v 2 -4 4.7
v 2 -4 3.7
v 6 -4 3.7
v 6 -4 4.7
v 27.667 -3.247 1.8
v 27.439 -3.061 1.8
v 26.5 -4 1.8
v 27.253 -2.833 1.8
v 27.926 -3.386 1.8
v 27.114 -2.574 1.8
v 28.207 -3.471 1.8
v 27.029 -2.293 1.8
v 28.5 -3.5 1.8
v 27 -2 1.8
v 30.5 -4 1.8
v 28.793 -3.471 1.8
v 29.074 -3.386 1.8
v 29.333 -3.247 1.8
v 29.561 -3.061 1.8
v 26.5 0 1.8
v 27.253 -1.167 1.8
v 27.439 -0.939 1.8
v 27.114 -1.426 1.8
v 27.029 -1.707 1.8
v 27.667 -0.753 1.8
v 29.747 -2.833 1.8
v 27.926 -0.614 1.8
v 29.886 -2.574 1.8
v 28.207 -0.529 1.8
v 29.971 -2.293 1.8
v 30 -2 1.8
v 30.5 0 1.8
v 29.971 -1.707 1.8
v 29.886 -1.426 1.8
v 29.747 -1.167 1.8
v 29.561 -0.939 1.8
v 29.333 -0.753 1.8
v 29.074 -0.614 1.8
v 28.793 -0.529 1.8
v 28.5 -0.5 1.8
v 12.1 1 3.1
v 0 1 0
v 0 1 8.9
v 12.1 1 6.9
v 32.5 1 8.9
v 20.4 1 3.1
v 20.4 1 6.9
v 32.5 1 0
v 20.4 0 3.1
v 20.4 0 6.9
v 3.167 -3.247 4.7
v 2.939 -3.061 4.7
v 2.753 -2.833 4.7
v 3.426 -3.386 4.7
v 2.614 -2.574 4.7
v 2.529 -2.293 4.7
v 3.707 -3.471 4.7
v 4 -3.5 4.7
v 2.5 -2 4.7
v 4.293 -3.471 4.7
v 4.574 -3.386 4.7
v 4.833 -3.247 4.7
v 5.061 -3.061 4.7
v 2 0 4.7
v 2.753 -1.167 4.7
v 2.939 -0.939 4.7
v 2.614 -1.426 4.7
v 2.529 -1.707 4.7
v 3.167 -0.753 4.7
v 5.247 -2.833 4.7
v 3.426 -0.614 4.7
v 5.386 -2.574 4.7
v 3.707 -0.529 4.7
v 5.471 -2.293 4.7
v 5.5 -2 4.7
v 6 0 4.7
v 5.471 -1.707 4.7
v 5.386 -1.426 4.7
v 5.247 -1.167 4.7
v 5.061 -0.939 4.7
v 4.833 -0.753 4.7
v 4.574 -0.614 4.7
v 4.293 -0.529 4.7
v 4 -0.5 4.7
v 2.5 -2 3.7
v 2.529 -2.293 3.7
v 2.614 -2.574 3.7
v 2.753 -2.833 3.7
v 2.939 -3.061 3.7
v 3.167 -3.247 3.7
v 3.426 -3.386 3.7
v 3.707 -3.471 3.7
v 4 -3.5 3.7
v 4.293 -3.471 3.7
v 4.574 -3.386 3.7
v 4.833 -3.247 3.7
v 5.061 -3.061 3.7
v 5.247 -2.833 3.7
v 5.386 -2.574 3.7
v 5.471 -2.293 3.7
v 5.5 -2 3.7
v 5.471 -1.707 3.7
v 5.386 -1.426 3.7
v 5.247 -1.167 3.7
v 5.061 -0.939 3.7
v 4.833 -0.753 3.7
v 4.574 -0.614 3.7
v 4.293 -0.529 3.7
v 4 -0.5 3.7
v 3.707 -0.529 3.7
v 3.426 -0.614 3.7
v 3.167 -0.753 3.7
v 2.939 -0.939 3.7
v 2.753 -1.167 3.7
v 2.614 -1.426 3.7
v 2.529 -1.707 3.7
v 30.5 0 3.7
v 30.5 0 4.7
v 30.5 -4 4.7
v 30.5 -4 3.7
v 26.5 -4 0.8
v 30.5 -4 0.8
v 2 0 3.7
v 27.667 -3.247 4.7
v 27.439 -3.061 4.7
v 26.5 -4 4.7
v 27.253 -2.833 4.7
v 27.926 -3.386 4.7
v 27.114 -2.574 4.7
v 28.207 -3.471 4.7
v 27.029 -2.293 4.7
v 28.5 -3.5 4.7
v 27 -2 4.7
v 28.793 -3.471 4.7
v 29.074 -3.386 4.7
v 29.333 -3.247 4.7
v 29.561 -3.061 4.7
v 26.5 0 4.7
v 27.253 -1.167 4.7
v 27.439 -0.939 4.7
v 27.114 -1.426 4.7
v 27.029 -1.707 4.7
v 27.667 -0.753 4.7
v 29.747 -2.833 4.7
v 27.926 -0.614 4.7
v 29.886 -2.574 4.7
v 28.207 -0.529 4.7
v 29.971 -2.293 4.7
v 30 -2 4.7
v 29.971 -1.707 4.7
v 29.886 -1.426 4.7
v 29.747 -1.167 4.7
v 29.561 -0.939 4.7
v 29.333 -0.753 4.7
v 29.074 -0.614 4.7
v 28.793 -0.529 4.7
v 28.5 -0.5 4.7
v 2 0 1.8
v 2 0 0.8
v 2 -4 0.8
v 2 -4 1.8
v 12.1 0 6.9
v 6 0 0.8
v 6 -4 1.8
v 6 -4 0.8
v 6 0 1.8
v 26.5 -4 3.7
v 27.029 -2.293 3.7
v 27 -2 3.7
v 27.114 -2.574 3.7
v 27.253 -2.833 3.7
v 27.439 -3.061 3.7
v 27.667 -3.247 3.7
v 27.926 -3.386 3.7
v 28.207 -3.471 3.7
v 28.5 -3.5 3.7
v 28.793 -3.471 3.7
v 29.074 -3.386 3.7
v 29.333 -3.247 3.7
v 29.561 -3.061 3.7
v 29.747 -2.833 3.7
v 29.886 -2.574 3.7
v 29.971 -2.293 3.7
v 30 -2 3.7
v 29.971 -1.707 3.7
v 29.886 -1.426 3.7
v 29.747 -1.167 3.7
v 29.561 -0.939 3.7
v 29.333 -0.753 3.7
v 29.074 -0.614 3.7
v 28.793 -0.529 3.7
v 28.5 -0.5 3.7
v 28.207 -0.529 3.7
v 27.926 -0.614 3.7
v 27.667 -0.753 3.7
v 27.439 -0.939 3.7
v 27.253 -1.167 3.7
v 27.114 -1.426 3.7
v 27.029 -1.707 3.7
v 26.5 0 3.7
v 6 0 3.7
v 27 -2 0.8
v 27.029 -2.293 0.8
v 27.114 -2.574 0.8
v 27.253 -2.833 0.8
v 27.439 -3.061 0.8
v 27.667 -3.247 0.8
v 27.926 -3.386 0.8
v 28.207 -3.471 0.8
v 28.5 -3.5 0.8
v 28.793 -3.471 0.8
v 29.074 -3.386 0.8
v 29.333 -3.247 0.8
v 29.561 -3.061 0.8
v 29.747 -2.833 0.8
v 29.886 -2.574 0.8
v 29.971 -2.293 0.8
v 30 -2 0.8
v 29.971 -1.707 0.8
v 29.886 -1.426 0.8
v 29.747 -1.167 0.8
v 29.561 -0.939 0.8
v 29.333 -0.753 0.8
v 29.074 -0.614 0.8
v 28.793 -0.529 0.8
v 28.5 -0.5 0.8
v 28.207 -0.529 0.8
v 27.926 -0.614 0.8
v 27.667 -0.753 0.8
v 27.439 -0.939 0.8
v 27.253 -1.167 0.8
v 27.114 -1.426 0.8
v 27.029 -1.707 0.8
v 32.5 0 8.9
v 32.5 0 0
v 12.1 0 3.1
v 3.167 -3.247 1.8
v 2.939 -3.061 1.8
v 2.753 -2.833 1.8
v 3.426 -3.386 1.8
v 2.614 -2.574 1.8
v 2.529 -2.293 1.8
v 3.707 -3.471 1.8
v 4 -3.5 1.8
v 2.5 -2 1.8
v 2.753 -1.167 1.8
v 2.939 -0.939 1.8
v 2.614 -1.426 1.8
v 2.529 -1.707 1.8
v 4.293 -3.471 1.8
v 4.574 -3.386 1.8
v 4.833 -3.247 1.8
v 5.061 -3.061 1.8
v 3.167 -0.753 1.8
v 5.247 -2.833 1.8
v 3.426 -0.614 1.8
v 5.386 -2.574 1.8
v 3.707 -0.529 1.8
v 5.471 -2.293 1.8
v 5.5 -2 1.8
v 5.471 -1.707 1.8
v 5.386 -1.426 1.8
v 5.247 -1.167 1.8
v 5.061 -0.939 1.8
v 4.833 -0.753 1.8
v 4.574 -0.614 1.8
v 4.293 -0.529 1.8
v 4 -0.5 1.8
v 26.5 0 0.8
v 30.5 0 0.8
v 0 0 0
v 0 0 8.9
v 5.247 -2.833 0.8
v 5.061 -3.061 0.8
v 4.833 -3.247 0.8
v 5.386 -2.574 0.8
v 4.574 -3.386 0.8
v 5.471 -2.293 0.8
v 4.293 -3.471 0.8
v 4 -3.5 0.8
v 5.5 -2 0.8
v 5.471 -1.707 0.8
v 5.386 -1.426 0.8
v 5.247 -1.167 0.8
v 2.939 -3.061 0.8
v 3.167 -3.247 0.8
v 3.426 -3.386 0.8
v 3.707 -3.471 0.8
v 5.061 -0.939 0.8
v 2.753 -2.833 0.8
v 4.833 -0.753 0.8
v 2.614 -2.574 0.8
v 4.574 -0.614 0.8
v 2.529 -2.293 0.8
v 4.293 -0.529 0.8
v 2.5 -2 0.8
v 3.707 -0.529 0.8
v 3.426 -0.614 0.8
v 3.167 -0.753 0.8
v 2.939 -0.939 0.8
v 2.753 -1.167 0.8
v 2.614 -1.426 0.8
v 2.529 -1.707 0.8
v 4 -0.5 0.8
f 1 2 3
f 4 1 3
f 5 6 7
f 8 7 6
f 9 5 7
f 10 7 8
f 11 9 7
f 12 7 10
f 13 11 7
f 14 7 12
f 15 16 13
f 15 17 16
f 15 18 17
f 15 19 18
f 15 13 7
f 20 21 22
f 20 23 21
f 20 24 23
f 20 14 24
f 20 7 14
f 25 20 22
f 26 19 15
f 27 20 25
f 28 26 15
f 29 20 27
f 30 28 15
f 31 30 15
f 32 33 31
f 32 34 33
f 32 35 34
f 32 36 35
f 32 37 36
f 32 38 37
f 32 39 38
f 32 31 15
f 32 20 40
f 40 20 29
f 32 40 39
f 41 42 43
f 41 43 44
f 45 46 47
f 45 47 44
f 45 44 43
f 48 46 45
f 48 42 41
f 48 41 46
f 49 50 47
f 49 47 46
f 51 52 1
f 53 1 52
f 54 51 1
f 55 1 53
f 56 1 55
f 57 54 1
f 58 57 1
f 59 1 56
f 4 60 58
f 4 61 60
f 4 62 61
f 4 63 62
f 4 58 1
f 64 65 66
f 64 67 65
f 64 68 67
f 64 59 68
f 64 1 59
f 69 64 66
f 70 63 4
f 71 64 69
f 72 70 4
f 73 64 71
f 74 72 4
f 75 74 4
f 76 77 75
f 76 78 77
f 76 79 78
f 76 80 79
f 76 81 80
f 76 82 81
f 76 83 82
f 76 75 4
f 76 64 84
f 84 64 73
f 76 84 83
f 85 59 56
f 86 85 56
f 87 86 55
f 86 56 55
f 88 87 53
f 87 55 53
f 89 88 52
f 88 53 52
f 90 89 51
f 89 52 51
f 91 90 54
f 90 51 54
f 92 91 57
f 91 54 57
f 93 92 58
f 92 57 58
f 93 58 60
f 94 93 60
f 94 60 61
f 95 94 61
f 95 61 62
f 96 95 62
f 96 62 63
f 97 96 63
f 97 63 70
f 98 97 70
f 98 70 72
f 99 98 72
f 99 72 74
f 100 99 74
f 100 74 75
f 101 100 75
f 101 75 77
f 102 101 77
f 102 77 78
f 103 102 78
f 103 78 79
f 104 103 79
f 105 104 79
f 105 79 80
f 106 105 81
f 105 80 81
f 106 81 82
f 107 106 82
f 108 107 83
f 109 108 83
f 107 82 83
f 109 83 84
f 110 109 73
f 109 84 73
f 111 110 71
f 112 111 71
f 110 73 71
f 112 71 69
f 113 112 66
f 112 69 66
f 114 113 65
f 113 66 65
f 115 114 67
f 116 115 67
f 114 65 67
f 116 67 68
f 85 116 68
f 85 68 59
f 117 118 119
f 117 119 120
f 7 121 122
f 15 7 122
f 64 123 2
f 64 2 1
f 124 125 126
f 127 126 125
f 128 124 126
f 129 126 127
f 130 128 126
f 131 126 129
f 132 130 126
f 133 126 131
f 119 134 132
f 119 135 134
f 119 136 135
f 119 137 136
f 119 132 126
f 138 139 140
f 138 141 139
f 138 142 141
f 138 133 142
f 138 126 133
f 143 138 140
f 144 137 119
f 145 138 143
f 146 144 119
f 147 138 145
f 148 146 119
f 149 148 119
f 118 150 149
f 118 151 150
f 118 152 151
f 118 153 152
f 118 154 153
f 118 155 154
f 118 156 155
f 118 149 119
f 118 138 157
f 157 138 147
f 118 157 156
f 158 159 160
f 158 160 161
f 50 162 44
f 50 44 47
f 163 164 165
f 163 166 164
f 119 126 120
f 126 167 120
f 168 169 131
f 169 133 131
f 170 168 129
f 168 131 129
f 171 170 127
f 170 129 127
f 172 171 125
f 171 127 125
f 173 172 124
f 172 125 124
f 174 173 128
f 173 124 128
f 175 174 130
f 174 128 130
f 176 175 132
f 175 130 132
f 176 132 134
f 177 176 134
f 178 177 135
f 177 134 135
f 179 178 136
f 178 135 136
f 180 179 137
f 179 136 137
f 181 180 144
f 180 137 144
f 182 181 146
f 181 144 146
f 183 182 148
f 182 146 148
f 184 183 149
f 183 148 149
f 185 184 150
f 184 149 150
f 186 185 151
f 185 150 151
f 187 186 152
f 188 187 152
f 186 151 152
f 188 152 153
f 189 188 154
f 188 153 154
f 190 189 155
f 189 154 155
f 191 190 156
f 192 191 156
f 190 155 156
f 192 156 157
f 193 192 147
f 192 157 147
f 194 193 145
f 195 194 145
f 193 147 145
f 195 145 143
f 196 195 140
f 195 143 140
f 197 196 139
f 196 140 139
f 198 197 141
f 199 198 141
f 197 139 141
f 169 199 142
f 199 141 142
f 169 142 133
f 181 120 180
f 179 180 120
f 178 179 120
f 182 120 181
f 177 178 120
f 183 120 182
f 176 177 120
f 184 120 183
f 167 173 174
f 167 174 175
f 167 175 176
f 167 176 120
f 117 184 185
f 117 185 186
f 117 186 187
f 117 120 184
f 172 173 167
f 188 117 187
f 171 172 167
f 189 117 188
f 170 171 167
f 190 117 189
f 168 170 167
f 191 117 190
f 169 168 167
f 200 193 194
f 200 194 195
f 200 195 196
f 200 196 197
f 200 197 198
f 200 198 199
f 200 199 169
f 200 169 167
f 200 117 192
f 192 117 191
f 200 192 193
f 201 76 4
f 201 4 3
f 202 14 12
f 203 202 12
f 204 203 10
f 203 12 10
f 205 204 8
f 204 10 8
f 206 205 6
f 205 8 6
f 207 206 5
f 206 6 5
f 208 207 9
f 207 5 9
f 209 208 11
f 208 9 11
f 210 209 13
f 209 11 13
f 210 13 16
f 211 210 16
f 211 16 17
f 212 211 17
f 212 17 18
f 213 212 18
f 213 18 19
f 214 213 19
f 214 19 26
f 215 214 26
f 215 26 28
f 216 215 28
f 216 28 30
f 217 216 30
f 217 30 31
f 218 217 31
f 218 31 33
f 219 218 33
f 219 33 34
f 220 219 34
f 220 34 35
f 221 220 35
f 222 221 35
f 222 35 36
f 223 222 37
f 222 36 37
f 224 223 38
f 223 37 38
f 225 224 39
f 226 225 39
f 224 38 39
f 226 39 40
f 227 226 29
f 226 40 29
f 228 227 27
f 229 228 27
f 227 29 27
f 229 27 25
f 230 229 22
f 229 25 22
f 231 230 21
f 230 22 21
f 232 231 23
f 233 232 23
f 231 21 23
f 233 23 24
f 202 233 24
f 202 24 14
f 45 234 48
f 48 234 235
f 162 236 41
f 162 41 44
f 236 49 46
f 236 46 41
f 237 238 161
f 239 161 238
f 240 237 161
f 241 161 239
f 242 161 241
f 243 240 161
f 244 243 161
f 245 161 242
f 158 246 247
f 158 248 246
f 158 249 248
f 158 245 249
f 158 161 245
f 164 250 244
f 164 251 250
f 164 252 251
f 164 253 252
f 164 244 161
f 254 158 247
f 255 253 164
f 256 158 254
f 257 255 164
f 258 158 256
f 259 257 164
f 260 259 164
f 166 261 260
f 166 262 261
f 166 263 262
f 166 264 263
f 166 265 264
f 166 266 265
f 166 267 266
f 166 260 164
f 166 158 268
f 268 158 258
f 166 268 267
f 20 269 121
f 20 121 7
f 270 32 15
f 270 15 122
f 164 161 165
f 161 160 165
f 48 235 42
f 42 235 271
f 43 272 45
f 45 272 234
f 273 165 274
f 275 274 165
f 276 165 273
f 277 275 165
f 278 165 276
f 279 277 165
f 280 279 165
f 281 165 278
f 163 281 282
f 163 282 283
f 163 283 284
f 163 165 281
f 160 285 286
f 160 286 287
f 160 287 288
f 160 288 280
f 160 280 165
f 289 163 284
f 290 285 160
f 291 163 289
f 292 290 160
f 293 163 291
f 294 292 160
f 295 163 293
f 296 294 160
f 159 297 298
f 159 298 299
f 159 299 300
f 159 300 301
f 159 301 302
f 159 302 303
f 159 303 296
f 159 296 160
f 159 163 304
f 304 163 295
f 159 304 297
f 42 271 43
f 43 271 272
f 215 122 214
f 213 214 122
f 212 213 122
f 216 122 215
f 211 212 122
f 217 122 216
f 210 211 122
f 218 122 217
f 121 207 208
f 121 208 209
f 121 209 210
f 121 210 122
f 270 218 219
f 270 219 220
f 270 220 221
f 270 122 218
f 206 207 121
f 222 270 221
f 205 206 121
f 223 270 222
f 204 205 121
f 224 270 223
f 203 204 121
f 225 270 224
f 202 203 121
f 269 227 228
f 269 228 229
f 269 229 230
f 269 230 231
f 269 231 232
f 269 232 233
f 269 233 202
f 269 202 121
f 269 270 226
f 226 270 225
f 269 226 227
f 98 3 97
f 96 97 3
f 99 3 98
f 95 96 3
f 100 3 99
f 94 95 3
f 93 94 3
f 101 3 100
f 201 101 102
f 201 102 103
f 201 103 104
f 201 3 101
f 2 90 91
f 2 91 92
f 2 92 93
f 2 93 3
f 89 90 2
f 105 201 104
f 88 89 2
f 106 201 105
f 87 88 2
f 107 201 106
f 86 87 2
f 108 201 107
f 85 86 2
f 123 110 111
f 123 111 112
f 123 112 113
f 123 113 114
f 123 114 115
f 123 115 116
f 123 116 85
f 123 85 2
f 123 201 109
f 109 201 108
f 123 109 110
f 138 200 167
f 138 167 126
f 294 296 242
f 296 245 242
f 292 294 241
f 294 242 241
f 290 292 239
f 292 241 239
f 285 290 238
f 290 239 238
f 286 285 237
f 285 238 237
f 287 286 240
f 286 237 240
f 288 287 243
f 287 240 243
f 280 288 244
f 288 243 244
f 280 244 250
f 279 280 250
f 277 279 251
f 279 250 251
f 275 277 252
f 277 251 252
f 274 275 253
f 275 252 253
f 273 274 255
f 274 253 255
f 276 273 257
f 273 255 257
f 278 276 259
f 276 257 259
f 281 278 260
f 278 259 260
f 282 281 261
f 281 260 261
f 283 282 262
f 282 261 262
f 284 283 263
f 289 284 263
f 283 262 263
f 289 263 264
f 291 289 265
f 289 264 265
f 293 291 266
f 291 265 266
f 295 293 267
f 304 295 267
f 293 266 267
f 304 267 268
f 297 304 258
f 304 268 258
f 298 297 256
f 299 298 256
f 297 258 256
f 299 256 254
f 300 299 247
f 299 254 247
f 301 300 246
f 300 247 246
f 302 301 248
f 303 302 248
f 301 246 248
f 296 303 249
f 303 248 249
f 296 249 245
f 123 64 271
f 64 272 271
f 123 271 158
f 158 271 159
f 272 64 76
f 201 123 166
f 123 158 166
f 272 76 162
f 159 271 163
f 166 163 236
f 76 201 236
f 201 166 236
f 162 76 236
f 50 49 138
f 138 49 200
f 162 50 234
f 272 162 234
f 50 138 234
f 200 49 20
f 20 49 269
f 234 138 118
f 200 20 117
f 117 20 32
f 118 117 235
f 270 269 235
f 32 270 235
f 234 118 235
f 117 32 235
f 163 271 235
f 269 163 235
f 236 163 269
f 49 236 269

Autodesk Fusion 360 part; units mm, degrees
sketch "Sketch1" plane through (0, 0, 0) normal (0, 1, 0) x (1, 0, 0)
  line L0 (2, -3.5) -> (30.5, -3.5)
  line L1 (30.5, -3.5) -> (30.5, -2)
  line L2 (30.5, -2) -> (2, -2)
  line L3 (2, -2) -> (2, -3.5)
  line L4 (12.5, -3.5) -> (20, -3.5)
  line L5 (20, -3.5) -> (20, -6.5)
  line L6 (20, -6.5) -> (12.5, -6.5)
  line L7 (12.5, -6.5) -> (12.5, -3.5)
  line L8 (12.1, -6.9) -> (20.4, -6.9)
  line L9 (20.4, -6.9) -> (20.4, -3.1)
  line L10 (20.4, -3.1) -> (12.1, -3.1)
  line L11 (12.1, -3.1) -> (12.1, -6.9)
  line L12 (0, -8.9) -> (32.5, -8.9)
  line L13 (32.5, -8.9) -> (32.5, 0)
  line L14 (32.5, 0) -> (0, 0)
  line L15 (0, 0) -> (0, -8.9)
  line L16 (30.5, -3.7) -> (26.5, -3.7)
  line L17 (26.5, -3.7) -> (26.5, -4.7)
  line L18 (26.5, -4.7) -> (30.5, -4.7)
  line L19 (30.5, -4.7) -> (30.5, -3.7)
  line L20 (26.5, -1.8) -> (30.5, -1.8)
  line L21 (30.5, -1.8) -> (30.5, -0.8)
  line L22 (30.5, -0.8) -> (26.5, -0.8)
  line L23 (26.5, -0.8) -> (26.5, -1.8)
  line L24 (2, -4.7) -> (6, -4.7)
  line L25 (6, -4.7) -> (6, -3.7)
  line L26 (6, -3.7) -> (2, -3.7)
  line L27 (2, -3.7) -> (2, -4.7)
  line L28 (2, -1.8) -> (6, -1.8)
  line L29 (6, -1.8) -> (6, -0.8)
  line L30 (6, -0.8) -> (2, -0.8)
  line L31 (2, -0.8) -> (2, -1.8)
  dimension "d1" = 28.5
  dimension "d2" = 1.5
  dimension "d3" = 7.5
  dimension "d4" = 3
  dimension "d5" = 10.5
  dimension "d6" = 0.4
  dimension "d7" = 0.4
  dimension "d8" = 0.4
  dimension "d9" = 0.4
  dimension "d10" = 2
  dimension "d11" = 2
  dimension "d12" = 2
  dimension "d13" = 2
  dimension "d30" = 4
  dimension "d31" = 1
  dimension "d32" = 0.2
  dimension "d33" = 4
  dimension "d34" = 4
  dimension "d35" = 1
  dimension "d36" = 0.2
  dimension "d37" = 4
  dimension "d38" = 4
  dimension "d39" = 1
  dimension "d40" = 4
  dimension "d41" = 1
  dimension "d42" = 4
  dimension "d43" = 4
  dimension "d44" = 0.2
  dimension "d45" = 0.2
extrude "Extrude1" add sketch "Sketch1" along normal blind 2 contours L0 L1 L2 L3 L9 L10 L11 | L12 L13 L14 L15 | L16 L17 L18 L19 | L20 L21 L22 L23 | L24 L25 L26 L27 | L28 L29 L30 L31
extrude "Extrude4" cut 1 faces at (28.4667, 2, 4) along direction (0, -1, 0) blind 1
extrude "Extrude5" add sketch "Sketch1" against normal blind 4 contours L16 L17 L18 L19 | L20 L21 L22 L23 | L24 L25 L26 L27 | L28 L29 L30 L31
sketch "Sketch3" plane through (0, 0, 4.7) normal (0, 0, 1) x (-1, 0, 0)
  line L0 (-6, 0) -> (-2, 0)
  line L1 (-2, 0) -> (-2, 4)
  line L2 (-2, 4) -> (-6, 4)
  line L3 (-6, 4) -> (-6, 0)
  circle A0 centre (-4, 2) radius 1.5
  circle A1 centre (-28.5, 2) radius 1.5
  dimension "d50" = 3
  dimension "d51" = 3
extrude "Extrude6" cut sketch "Sketch3" against normal blind 8 contours A0 | A1
equation "d5 = ( 21 / 2 ) * 1 mm"
